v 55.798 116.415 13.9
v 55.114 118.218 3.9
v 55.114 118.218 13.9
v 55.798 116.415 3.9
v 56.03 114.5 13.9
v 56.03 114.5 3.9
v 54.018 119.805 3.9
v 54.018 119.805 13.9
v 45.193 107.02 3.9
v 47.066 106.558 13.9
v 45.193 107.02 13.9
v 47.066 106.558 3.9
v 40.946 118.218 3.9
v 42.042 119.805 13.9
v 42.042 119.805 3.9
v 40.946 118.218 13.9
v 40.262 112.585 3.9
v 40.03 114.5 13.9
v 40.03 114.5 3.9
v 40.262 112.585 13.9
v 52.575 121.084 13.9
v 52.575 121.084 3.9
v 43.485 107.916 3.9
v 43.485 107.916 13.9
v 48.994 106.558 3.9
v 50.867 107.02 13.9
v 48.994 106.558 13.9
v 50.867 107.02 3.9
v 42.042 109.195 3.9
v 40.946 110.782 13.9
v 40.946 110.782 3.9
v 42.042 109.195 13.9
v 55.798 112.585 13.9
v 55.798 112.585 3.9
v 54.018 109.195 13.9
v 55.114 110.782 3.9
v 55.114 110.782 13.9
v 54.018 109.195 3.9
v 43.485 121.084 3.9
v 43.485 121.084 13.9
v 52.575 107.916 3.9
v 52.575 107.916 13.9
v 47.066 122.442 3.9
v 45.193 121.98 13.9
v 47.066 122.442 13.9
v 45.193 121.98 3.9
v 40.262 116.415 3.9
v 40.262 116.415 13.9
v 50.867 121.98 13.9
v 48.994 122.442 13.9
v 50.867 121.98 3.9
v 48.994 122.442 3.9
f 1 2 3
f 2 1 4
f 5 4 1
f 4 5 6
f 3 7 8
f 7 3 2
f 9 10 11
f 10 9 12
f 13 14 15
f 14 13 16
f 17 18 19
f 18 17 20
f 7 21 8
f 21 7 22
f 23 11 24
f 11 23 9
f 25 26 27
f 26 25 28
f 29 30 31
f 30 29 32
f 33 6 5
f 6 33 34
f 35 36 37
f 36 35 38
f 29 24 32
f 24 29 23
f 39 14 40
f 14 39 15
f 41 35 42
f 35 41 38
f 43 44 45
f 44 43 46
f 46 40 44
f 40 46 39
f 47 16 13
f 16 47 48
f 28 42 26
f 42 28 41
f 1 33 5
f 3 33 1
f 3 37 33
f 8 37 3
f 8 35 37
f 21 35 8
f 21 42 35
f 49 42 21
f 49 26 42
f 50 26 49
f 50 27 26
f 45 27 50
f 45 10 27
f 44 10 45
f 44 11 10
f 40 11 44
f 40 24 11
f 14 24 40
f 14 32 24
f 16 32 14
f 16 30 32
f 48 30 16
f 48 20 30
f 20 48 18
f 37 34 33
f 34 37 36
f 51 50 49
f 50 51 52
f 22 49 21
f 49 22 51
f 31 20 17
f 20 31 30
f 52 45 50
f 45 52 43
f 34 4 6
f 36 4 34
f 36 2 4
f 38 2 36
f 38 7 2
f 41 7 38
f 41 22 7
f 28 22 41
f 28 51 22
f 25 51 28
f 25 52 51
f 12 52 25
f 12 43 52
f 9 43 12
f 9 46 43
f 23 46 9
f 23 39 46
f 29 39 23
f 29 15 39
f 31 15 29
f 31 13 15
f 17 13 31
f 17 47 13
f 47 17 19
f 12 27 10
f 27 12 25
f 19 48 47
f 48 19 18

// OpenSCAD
module dxf_holder(){
linear_extrude(height = 8, center = true, convexity = 5)
   import (file = "spool holdahMK3.dxf", layer = "0");
}
module spool_holder_left(){
    dxf_holder();
    translate([51.53-3.5,123-5-3.5,3.9])cylinder(h = 10, r=8);
    }

difference() {    
    spool_holder_left();
    translate([-7,-5,-4])cube([1,5,10]);
}
